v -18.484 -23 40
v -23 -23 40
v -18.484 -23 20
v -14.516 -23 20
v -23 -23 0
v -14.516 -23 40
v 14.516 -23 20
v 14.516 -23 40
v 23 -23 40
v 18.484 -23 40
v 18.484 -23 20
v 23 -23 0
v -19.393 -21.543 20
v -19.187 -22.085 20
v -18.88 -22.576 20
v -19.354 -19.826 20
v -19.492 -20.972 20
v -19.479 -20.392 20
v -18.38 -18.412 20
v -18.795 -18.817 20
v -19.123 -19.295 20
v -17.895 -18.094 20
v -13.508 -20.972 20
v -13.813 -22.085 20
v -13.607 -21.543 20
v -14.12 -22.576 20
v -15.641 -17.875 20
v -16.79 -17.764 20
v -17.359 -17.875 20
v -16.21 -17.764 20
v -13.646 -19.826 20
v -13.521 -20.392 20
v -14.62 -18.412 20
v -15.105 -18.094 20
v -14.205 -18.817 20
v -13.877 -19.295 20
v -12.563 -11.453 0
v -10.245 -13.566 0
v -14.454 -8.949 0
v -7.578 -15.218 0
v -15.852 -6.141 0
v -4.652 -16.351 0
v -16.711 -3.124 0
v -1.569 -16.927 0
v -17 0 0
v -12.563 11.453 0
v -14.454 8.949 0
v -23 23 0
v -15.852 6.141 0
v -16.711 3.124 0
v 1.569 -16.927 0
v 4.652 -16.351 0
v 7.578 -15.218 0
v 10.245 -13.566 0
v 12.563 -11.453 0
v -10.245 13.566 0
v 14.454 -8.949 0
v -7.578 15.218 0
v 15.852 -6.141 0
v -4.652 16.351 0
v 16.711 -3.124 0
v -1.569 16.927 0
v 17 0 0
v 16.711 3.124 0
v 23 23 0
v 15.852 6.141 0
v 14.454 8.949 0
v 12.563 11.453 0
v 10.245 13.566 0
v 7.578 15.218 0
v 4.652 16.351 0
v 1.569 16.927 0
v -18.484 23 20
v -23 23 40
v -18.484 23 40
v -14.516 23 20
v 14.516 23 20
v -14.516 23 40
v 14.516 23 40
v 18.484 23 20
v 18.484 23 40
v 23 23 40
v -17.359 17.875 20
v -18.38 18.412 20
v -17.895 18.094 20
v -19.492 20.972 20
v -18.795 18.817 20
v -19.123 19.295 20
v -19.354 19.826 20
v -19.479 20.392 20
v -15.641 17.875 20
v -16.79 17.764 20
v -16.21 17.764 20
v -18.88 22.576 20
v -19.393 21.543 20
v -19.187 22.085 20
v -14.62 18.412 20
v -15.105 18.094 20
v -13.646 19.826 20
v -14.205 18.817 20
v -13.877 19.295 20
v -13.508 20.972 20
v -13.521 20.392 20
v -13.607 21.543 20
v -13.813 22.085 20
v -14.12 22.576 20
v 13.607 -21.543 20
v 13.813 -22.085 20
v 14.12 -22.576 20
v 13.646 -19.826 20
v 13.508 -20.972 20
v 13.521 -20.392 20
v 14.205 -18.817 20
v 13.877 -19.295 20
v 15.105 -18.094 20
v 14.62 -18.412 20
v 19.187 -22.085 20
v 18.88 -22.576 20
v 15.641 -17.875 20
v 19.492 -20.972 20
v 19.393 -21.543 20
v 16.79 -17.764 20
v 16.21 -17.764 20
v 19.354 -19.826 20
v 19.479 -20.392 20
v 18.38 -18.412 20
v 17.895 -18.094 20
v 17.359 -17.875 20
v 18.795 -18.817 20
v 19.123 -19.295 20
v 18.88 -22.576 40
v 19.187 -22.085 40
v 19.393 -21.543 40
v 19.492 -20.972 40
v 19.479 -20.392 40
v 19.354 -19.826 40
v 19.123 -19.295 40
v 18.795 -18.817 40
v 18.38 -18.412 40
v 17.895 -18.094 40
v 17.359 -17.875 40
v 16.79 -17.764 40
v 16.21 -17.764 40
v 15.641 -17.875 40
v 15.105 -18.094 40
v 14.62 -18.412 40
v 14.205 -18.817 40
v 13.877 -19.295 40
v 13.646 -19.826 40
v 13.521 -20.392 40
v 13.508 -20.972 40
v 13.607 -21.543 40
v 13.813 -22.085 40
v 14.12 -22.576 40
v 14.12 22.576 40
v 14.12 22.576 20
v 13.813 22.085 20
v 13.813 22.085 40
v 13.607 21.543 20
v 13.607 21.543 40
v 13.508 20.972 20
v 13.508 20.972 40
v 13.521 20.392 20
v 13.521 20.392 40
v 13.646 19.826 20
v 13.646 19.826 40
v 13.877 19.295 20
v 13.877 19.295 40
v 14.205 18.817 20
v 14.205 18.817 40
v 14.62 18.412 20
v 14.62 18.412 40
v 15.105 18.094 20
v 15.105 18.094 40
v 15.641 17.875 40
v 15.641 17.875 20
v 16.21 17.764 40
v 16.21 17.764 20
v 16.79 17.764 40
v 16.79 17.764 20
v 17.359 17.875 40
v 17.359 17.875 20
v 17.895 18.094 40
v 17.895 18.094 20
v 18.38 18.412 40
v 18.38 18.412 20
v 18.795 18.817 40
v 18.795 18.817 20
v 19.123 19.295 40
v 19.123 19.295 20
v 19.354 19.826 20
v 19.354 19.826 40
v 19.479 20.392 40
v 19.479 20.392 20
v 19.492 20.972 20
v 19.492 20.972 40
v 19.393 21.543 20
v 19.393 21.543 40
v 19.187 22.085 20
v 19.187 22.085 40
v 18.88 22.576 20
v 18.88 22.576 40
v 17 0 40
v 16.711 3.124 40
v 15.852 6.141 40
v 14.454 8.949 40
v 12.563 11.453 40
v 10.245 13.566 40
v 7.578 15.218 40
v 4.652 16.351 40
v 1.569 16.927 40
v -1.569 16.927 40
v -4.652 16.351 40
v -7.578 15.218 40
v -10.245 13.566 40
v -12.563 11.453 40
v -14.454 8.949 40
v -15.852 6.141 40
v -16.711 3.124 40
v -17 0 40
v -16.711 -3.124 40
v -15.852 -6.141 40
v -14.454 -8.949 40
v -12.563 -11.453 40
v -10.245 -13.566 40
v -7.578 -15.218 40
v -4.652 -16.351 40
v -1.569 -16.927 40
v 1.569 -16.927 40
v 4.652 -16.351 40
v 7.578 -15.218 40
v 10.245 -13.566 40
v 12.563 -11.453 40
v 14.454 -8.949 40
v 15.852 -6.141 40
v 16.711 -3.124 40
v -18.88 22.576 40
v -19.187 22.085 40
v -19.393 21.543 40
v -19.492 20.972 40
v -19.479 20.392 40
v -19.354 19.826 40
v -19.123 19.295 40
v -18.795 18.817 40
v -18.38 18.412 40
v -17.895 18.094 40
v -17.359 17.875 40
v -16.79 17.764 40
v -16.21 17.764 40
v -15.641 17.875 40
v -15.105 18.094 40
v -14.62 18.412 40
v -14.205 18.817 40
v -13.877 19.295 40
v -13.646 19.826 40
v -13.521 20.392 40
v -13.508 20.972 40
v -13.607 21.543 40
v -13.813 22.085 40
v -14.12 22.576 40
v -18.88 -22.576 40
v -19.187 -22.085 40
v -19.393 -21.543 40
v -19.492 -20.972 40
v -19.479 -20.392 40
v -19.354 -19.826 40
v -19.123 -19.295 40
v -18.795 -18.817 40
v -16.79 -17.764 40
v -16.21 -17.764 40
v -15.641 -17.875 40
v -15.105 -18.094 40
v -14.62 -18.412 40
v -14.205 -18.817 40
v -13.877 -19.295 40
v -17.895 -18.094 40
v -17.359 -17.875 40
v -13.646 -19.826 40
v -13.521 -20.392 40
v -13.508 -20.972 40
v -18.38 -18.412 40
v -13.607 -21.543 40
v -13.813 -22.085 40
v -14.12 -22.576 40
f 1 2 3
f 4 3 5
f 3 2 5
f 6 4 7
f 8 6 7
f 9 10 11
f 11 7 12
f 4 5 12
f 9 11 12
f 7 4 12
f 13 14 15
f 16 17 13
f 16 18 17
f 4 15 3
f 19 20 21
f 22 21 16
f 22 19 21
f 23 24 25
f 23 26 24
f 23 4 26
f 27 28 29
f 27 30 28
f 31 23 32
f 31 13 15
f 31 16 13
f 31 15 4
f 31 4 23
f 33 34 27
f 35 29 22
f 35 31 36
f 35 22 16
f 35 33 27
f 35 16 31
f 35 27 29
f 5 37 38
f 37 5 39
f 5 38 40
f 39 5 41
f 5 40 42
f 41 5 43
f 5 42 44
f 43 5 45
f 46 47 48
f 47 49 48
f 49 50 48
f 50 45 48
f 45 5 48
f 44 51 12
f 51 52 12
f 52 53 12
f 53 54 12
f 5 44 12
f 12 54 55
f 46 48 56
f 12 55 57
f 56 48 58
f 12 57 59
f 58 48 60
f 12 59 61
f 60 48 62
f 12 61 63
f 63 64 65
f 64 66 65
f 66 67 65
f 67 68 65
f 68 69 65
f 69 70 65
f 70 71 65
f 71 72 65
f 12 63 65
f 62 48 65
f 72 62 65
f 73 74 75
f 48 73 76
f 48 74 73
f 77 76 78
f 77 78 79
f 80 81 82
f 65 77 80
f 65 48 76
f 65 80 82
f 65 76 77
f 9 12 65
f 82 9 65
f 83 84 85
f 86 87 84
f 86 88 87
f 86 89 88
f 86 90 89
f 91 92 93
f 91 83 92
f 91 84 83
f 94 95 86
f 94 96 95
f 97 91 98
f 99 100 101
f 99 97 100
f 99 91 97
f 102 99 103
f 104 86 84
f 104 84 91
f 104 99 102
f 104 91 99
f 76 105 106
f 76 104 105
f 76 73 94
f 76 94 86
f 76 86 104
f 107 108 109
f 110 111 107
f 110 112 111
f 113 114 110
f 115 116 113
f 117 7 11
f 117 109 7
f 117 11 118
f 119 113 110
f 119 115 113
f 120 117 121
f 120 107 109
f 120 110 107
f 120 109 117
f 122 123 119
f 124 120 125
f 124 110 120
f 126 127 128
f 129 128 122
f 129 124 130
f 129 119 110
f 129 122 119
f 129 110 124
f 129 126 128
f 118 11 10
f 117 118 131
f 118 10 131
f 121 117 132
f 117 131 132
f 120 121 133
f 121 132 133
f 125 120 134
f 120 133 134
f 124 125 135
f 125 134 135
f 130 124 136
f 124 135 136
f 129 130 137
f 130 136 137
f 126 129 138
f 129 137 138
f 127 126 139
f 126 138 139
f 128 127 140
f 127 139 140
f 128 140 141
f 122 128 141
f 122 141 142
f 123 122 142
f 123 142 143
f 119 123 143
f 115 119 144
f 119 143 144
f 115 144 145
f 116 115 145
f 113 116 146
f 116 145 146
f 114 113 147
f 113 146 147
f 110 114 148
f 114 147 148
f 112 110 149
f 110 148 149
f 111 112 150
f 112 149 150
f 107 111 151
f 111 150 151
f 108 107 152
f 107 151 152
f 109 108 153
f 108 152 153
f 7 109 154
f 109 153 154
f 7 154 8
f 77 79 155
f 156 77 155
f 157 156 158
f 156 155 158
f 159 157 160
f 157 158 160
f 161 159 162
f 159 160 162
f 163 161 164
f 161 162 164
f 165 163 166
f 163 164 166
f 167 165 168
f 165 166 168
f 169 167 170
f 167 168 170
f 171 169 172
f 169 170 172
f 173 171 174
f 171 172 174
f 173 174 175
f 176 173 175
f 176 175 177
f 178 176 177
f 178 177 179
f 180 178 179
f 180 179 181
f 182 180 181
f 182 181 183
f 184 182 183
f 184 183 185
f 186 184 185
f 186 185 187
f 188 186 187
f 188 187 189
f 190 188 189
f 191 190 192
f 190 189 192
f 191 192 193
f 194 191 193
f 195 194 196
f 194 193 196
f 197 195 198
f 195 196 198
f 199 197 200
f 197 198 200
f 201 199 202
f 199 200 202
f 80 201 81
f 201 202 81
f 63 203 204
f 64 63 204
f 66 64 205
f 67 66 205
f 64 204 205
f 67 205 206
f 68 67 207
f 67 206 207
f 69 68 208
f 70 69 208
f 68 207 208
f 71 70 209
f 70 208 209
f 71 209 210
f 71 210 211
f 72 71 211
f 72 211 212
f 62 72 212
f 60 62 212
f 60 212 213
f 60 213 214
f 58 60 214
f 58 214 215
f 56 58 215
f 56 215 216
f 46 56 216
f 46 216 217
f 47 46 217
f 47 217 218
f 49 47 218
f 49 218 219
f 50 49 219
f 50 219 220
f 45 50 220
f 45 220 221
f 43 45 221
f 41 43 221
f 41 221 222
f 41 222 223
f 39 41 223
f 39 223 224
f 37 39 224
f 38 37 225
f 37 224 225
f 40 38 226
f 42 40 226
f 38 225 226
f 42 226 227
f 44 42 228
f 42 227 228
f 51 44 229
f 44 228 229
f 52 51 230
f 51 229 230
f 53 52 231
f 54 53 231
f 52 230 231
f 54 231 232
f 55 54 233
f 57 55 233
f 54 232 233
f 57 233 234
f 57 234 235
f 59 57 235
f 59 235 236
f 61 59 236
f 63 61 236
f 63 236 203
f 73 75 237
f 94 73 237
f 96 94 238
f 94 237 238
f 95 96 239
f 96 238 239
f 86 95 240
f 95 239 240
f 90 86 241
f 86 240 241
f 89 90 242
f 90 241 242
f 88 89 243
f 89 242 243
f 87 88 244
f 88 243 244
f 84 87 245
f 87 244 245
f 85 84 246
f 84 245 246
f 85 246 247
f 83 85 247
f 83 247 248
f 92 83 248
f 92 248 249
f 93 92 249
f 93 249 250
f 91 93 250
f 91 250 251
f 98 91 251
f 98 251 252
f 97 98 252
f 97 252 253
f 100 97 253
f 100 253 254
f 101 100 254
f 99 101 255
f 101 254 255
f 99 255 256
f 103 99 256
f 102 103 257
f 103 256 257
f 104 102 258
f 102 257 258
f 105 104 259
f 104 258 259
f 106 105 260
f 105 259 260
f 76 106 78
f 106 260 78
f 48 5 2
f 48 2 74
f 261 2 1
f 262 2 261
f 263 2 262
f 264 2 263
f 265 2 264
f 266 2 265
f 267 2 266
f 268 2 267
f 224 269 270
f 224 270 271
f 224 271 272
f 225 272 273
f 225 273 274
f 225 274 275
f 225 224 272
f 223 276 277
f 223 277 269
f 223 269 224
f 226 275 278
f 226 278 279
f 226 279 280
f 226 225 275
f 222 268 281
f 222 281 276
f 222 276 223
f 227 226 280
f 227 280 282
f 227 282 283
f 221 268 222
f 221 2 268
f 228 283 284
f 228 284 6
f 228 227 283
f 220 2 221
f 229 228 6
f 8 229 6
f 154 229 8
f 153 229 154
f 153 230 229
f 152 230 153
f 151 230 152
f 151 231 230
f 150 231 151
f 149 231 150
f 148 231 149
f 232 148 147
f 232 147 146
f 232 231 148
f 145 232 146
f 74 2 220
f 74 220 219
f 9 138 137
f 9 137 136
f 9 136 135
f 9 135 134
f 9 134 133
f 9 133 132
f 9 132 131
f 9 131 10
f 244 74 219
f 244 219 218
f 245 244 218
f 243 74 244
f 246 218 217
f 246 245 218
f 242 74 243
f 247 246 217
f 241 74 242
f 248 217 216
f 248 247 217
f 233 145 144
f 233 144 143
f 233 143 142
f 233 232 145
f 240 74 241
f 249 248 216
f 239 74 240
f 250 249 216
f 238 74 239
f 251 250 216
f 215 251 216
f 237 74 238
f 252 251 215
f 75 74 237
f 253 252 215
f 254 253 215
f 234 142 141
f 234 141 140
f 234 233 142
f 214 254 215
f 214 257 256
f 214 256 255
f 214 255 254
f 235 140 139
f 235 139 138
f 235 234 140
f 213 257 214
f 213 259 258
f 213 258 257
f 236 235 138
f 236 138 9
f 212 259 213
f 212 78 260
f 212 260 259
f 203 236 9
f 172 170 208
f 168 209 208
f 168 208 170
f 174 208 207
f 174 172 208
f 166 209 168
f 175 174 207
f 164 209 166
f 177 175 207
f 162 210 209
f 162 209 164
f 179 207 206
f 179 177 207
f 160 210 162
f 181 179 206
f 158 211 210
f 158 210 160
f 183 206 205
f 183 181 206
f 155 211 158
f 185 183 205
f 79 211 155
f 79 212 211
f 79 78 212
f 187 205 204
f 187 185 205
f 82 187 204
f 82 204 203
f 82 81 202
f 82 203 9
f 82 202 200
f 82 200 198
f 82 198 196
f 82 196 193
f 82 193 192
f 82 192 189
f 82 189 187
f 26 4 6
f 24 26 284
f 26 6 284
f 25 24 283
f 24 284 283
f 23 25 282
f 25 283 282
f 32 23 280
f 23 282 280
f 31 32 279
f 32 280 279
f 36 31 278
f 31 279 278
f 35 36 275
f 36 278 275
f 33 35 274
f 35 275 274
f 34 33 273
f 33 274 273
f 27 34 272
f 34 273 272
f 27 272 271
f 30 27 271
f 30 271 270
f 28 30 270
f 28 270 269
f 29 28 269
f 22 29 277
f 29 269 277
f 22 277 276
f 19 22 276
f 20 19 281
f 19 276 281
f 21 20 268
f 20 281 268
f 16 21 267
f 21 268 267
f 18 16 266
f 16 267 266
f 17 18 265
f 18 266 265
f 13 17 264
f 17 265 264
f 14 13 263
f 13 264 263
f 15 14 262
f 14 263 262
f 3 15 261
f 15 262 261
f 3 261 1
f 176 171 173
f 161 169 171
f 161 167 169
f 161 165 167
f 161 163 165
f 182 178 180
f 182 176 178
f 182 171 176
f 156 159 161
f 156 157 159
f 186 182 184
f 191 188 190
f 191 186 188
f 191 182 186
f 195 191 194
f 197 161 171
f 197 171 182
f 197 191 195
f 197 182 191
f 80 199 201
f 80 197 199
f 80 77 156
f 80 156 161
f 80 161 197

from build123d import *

# Parameters (mm, degrees)
SKETCH_W        = 46
SKETCH_H        = 46
PAD_DEPTH       = 40
SKETCH001_R     = 17
POCKET_DEPTH    = 40.001
SKETCH002_R     = 3
POCKET001_DEPTH = 20


with BuildPart() as part:
    # Sketch → Pad (new body)
    with BuildSketch(Plane.XY):
        Rectangle(SKETCH_W, SKETCH_H)
    extrude(amount=PAD_DEPTH)

    # Sketch001 (on Face6 of Pad) → Pocket (cut, through all)
    with BuildSketch(Plane.XY.offset(40)):
        Circle(SKETCH001_R)
    extrude(amount=-POCKET_DEPTH, mode=Mode.SUBTRACT)

    # Sketch002 (on Face5 of Pocket) → Pocket001 (cut)
    with BuildSketch(Plane.XY.offset(40)):
        with Locations((16.5, 20.75)):
            Circle(SKETCH002_R)
        with Locations((-16.5, 20.75)):
            Circle(SKETCH002_R)
        with Locations((-16.5, -20.75)):
            Circle(SKETCH002_R)
        with Locations((16.5, -20.75)):
            Circle(SKETCH002_R)
    extrude(amount=-POCKET001_DEPTH, mode=Mode.SUBTRACT)


solid = part.part
